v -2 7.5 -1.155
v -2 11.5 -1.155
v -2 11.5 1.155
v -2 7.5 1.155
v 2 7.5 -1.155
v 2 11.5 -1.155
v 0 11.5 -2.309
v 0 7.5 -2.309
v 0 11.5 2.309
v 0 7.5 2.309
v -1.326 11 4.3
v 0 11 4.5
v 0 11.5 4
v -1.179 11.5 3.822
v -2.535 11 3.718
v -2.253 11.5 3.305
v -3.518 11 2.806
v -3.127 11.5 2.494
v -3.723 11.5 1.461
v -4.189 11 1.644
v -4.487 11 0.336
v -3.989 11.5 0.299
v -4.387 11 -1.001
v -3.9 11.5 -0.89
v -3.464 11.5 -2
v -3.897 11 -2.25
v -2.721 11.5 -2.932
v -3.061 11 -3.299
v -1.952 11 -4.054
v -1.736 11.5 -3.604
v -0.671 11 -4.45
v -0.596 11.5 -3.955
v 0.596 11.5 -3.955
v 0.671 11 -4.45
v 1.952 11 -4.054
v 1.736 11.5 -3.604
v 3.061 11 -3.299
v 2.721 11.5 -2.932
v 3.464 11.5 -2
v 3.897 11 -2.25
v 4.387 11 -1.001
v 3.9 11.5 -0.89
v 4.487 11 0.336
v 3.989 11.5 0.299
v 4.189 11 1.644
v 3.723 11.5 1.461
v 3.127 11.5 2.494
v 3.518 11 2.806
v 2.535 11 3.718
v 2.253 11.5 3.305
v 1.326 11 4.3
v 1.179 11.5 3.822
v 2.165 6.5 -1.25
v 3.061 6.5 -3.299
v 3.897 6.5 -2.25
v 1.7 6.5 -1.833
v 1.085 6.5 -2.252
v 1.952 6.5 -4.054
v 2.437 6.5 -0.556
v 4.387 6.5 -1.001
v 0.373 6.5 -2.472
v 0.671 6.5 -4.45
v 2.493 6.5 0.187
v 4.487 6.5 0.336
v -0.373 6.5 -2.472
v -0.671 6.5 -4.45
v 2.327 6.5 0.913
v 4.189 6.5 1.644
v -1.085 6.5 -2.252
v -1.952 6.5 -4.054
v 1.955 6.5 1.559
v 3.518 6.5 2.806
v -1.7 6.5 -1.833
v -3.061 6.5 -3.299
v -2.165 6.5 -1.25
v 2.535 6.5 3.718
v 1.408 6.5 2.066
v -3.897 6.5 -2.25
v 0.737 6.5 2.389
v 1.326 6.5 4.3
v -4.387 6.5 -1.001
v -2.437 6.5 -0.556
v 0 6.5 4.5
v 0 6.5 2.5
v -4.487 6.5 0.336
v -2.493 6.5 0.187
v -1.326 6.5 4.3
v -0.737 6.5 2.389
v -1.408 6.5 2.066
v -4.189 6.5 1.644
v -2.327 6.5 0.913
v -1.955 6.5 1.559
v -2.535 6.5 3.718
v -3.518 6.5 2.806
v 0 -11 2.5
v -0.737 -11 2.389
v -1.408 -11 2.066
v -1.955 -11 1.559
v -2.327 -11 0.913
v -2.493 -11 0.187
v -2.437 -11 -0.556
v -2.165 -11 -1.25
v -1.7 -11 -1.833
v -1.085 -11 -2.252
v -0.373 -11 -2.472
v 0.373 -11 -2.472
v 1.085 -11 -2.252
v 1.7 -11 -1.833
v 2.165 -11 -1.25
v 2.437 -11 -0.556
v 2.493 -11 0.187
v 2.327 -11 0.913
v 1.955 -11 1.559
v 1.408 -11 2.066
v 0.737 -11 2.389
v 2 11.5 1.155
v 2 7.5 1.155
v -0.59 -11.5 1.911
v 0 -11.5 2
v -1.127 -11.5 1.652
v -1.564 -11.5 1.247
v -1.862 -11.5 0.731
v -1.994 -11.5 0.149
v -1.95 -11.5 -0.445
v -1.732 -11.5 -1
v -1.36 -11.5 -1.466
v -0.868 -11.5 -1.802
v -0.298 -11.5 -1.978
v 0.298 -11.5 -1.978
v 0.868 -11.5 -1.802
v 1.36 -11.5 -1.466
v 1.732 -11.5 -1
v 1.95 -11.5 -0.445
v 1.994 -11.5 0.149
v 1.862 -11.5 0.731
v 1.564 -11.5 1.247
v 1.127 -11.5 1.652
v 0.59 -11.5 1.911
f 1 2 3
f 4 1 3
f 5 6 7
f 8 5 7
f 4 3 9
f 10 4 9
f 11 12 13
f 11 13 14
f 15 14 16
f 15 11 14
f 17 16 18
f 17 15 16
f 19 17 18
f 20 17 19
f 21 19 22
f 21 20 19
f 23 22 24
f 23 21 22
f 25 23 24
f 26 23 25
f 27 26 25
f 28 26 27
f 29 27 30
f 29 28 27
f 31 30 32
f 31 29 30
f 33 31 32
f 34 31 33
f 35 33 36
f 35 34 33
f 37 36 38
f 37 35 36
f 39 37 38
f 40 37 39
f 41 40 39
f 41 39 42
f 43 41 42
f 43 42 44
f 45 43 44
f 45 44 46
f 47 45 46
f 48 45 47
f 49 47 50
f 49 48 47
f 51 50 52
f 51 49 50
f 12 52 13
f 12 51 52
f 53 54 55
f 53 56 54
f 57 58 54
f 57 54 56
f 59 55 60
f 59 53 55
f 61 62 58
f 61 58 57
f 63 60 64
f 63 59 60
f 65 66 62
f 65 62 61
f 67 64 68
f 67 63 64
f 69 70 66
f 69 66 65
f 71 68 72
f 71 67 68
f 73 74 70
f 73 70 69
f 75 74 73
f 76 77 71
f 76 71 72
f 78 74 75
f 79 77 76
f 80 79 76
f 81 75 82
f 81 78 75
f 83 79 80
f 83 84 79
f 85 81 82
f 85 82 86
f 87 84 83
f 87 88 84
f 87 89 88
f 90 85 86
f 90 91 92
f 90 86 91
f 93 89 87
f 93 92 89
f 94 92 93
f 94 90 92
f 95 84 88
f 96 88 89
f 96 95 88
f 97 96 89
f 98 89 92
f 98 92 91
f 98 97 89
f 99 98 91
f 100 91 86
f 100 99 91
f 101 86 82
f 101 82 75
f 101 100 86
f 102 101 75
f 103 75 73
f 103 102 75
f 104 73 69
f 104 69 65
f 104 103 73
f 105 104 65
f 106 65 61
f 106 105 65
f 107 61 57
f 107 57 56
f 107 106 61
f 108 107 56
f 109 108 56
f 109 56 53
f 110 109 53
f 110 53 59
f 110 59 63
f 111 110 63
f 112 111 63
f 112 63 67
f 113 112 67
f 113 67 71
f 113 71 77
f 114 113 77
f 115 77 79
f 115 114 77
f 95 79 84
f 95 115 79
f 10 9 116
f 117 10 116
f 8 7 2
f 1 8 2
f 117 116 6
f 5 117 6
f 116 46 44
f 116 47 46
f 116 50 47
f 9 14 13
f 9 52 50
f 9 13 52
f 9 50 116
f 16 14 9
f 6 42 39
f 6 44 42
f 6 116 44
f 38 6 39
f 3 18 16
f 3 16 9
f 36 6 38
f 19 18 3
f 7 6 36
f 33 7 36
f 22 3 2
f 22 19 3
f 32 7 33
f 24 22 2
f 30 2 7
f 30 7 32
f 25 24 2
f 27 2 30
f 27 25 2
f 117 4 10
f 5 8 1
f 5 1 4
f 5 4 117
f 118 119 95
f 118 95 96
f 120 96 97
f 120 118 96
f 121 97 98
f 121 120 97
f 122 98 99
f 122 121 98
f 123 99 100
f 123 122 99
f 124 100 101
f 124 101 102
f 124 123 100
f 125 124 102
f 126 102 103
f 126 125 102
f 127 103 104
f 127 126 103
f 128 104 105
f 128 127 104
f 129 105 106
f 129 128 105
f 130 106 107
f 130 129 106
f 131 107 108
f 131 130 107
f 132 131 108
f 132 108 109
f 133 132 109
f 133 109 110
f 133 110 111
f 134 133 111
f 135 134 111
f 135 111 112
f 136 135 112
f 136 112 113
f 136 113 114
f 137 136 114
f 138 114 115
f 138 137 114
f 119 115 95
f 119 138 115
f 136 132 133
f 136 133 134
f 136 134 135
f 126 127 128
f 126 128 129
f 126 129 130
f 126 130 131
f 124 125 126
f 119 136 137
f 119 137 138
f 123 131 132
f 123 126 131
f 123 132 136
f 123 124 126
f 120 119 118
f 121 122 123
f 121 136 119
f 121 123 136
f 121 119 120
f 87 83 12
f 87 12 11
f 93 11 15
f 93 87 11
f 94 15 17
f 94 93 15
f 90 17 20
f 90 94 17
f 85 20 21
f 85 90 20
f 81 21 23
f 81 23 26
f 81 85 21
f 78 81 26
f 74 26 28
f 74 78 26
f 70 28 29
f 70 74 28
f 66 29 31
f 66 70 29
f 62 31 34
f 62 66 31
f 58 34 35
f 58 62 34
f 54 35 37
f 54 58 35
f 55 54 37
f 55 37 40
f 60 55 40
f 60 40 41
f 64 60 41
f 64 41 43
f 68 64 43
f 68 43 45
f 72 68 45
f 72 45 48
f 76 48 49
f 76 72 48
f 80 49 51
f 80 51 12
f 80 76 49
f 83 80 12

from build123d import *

# Parameters (mm, degrees)
CUT_EXTRUDE1_DEPTH = 4
CHAMFER1_SIZE      = 0.5
CHAMFER2_SIZE      = 0.5


with BuildPart() as part:
    # Sketch1 → Revolve1 (revolve)
    with BuildSketch(Plane.XY, mode=Mode.PRIVATE) as revolve1_sk:
        Polygon((0, 11.5), (4.5, 11.5), (4.5, 6.5), (2.5, 6.5), (2.5, -11.5), (0, -11.5), align=None)
    revolve(revolve1_sk.sketch.rotate(Axis((0, 14.918478261, 0), (0, -1, 0)), 90), axis=Axis((0, 14.918478261, 0), (0, -1, 0)))

    # Sketch2 → Cut-Extrude1 (cut)
    with BuildSketch(Plane(origin=(0, 11.5, 0), x_dir=(1, 0, 0), z_dir=(0, 1, 0))):
        Polygon((0, 2.309401077), (-2, 1.154700538), (-2, -1.154700538), (0, -2.309401077), (2, -1.154700538), (2, 1.154700538), align=None)
    extrude(amount=-CUT_EXTRUDE1_DEPTH, mode=Mode.SUBTRACT)

    # Chamfer1
    chamfer1_edges = [part.edges().sort_by_distance(p)[0] for p in [
        (0, 11.5, -4.5),
    ]]
    chamfer(chamfer1_edges, length=CHAMFER1_SIZE)

    # Chamfer2
    chamfer2_edges = [part.edges().sort_by_distance(p)[0] for p in [
        (0, -11.5, -2.5),
    ]]
    chamfer(chamfer2_edges, length=CHAMFER2_SIZE)


solid = part.part
